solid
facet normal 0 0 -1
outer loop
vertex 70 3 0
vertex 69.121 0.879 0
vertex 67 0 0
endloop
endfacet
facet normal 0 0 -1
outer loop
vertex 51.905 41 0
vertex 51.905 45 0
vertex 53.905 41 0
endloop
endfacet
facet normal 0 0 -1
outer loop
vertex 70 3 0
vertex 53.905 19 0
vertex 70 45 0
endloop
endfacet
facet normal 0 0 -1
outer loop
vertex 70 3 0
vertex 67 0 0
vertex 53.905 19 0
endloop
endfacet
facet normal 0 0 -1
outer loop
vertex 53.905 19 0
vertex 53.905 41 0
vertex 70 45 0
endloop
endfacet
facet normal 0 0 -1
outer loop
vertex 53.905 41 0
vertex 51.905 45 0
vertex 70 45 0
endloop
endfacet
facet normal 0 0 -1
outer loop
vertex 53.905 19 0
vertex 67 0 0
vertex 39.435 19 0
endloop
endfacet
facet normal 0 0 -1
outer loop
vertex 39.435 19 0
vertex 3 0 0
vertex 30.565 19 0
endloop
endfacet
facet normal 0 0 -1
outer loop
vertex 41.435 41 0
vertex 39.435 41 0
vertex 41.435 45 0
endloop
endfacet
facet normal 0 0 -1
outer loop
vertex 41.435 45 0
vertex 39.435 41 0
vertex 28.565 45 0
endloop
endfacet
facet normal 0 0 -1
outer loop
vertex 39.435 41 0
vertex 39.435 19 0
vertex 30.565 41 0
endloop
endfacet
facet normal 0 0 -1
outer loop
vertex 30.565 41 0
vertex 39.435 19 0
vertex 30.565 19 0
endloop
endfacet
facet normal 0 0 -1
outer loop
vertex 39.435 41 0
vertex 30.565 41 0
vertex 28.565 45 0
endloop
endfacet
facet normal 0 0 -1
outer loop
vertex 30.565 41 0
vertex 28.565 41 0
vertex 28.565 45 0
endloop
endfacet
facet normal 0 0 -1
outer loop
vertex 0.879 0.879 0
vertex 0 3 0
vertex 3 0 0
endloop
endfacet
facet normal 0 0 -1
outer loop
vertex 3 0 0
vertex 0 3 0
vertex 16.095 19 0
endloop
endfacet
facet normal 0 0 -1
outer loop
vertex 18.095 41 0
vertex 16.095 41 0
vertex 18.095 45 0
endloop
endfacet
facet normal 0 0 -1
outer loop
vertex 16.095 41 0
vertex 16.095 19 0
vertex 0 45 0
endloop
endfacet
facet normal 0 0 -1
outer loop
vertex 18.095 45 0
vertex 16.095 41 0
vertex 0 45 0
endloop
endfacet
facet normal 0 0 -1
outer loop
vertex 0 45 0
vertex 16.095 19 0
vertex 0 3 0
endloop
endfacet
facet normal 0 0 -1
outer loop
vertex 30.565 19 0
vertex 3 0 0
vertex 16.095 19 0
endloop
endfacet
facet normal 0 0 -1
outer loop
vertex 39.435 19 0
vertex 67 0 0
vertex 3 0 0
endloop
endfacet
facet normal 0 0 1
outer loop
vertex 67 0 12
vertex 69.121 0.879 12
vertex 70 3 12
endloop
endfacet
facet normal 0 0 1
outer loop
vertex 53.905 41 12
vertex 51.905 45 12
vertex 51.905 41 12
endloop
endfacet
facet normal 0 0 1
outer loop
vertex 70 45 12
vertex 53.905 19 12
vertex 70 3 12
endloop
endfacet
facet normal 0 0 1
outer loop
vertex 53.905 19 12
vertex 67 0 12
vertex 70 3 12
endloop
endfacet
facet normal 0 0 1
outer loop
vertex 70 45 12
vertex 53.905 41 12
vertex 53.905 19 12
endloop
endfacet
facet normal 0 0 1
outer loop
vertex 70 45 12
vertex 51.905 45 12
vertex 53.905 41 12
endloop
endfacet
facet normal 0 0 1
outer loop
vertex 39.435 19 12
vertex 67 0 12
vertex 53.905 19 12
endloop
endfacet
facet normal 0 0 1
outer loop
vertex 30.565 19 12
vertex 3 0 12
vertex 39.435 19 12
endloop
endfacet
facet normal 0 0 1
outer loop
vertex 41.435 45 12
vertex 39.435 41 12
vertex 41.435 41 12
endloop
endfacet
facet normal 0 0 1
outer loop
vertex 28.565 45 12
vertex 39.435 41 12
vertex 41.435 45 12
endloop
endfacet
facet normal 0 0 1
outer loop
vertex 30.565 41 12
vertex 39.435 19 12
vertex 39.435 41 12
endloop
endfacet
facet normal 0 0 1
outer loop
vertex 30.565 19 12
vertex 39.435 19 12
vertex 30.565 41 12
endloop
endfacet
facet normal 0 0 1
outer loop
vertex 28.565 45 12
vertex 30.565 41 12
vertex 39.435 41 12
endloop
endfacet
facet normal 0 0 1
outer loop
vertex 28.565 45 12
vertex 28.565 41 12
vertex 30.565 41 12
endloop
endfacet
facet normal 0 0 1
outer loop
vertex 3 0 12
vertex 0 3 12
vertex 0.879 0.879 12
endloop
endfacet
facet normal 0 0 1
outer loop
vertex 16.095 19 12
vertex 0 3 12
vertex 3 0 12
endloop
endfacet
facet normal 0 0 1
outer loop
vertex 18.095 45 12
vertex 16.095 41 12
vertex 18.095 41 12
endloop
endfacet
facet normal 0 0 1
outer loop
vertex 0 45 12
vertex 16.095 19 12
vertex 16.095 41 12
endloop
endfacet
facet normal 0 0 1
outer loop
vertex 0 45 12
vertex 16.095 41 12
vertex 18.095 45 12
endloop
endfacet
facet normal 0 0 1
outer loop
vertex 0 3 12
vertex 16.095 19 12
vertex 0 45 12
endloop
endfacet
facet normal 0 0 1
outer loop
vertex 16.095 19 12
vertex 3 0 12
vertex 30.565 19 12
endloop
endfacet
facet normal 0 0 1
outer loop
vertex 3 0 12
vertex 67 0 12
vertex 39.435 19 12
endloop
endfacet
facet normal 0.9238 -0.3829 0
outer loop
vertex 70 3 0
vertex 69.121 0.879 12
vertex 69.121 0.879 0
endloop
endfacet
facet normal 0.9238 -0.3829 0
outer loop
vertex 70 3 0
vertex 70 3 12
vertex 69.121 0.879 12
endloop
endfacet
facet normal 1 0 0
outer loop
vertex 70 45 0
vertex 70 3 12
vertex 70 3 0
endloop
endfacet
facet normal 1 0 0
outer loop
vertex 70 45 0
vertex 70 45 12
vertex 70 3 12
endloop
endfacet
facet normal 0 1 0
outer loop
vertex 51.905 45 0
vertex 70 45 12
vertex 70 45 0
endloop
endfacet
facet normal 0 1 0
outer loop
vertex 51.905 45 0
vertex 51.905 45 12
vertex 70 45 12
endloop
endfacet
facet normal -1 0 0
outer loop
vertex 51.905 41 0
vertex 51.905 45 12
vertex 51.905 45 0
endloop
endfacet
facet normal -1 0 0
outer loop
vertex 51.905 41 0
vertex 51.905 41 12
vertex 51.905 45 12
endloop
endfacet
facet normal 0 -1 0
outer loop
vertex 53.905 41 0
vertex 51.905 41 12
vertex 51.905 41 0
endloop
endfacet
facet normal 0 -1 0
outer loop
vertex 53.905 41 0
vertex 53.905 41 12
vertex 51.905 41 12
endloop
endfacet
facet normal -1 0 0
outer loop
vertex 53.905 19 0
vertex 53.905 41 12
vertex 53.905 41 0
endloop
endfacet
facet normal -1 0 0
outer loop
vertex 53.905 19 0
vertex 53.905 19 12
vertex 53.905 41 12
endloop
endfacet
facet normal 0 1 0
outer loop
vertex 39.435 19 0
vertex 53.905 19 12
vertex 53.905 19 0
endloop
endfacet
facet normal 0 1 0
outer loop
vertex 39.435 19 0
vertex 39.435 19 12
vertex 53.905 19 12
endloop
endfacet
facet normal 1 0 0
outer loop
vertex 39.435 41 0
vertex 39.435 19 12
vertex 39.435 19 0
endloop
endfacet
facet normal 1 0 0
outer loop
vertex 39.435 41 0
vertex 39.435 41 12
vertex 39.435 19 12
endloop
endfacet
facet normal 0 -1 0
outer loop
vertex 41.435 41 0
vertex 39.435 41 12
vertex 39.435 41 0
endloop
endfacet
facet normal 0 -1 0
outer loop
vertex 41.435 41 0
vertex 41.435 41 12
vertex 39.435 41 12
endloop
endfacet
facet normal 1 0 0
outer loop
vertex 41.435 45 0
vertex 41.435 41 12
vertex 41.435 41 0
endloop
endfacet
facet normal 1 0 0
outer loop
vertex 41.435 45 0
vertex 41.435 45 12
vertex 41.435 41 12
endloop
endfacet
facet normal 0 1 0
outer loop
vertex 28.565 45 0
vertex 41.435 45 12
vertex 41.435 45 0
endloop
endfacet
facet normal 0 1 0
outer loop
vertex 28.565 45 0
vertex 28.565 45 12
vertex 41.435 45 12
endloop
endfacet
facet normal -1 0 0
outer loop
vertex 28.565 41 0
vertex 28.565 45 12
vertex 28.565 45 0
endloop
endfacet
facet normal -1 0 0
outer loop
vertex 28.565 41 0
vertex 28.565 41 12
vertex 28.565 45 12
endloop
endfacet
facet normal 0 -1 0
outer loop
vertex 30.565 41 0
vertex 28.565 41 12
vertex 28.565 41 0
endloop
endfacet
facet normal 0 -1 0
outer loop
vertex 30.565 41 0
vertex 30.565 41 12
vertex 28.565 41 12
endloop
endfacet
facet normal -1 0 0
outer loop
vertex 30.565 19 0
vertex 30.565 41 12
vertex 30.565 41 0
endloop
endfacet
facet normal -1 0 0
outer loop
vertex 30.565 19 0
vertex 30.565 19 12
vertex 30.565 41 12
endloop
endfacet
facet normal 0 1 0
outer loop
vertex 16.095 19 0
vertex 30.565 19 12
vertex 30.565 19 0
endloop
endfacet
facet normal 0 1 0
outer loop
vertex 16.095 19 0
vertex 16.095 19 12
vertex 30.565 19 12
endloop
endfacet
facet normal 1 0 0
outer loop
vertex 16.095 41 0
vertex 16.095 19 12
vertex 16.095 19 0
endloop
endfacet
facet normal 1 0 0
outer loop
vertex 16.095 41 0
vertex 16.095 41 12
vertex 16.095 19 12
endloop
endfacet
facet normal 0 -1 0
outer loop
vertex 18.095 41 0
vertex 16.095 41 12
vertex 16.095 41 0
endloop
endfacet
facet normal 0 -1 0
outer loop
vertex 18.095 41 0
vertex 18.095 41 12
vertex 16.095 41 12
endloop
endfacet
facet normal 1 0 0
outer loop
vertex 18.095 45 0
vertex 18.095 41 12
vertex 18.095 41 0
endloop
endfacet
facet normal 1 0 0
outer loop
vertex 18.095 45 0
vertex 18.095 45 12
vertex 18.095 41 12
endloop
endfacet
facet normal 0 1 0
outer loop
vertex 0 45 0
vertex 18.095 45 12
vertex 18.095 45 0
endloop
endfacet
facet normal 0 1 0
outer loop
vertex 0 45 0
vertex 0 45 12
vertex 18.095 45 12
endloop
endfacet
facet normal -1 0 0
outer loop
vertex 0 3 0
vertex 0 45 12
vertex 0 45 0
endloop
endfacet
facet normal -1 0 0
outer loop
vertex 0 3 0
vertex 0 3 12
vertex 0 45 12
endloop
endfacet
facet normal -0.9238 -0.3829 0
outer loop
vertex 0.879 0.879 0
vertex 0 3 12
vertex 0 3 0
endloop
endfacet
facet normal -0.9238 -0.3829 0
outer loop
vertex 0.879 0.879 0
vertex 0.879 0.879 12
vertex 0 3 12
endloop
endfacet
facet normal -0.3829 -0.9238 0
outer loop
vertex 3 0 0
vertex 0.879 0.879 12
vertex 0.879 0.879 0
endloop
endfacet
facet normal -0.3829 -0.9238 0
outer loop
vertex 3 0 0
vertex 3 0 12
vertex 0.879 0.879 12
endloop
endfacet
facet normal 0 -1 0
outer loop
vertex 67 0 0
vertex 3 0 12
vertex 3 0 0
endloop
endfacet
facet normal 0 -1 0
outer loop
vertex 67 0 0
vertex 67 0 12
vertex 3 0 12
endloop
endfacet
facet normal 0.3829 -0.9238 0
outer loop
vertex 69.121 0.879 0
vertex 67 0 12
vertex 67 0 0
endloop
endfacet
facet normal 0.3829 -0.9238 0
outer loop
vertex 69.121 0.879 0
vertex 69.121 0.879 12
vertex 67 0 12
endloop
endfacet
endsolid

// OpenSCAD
$fn = 32;

// ----------------------------------------------------------------------
// Window plate: 70 x 45 mm, 2 open windows
// ----------------------------------------------------------------------

// --- parameters (mm) ---
profile_height = 12;      // extrusion height
profile_points = 24;      // points of the closed outline

profile = [[0, 3], [0.879, 0.879], [3, 0], [67, 0], [69.121, 0.879], [70, 3], [70, 45], [51.905, 45], [51.905, 41], [53.905, 41], [53.905, 19], [39.435, 19], [39.435, 41], [41.435, 41], [41.435, 45], [28.565, 45], [28.565, 41], [30.565, 41], [30.565, 19], [16.095, 19], [16.095, 41], [18.095, 41], [18.095, 45], [0, 45]];  // single closed polygon, 24 points, counter clockwise

// --- the one profile operation ---
linear_extrude(height = profile_height) polygon(points = profile);
